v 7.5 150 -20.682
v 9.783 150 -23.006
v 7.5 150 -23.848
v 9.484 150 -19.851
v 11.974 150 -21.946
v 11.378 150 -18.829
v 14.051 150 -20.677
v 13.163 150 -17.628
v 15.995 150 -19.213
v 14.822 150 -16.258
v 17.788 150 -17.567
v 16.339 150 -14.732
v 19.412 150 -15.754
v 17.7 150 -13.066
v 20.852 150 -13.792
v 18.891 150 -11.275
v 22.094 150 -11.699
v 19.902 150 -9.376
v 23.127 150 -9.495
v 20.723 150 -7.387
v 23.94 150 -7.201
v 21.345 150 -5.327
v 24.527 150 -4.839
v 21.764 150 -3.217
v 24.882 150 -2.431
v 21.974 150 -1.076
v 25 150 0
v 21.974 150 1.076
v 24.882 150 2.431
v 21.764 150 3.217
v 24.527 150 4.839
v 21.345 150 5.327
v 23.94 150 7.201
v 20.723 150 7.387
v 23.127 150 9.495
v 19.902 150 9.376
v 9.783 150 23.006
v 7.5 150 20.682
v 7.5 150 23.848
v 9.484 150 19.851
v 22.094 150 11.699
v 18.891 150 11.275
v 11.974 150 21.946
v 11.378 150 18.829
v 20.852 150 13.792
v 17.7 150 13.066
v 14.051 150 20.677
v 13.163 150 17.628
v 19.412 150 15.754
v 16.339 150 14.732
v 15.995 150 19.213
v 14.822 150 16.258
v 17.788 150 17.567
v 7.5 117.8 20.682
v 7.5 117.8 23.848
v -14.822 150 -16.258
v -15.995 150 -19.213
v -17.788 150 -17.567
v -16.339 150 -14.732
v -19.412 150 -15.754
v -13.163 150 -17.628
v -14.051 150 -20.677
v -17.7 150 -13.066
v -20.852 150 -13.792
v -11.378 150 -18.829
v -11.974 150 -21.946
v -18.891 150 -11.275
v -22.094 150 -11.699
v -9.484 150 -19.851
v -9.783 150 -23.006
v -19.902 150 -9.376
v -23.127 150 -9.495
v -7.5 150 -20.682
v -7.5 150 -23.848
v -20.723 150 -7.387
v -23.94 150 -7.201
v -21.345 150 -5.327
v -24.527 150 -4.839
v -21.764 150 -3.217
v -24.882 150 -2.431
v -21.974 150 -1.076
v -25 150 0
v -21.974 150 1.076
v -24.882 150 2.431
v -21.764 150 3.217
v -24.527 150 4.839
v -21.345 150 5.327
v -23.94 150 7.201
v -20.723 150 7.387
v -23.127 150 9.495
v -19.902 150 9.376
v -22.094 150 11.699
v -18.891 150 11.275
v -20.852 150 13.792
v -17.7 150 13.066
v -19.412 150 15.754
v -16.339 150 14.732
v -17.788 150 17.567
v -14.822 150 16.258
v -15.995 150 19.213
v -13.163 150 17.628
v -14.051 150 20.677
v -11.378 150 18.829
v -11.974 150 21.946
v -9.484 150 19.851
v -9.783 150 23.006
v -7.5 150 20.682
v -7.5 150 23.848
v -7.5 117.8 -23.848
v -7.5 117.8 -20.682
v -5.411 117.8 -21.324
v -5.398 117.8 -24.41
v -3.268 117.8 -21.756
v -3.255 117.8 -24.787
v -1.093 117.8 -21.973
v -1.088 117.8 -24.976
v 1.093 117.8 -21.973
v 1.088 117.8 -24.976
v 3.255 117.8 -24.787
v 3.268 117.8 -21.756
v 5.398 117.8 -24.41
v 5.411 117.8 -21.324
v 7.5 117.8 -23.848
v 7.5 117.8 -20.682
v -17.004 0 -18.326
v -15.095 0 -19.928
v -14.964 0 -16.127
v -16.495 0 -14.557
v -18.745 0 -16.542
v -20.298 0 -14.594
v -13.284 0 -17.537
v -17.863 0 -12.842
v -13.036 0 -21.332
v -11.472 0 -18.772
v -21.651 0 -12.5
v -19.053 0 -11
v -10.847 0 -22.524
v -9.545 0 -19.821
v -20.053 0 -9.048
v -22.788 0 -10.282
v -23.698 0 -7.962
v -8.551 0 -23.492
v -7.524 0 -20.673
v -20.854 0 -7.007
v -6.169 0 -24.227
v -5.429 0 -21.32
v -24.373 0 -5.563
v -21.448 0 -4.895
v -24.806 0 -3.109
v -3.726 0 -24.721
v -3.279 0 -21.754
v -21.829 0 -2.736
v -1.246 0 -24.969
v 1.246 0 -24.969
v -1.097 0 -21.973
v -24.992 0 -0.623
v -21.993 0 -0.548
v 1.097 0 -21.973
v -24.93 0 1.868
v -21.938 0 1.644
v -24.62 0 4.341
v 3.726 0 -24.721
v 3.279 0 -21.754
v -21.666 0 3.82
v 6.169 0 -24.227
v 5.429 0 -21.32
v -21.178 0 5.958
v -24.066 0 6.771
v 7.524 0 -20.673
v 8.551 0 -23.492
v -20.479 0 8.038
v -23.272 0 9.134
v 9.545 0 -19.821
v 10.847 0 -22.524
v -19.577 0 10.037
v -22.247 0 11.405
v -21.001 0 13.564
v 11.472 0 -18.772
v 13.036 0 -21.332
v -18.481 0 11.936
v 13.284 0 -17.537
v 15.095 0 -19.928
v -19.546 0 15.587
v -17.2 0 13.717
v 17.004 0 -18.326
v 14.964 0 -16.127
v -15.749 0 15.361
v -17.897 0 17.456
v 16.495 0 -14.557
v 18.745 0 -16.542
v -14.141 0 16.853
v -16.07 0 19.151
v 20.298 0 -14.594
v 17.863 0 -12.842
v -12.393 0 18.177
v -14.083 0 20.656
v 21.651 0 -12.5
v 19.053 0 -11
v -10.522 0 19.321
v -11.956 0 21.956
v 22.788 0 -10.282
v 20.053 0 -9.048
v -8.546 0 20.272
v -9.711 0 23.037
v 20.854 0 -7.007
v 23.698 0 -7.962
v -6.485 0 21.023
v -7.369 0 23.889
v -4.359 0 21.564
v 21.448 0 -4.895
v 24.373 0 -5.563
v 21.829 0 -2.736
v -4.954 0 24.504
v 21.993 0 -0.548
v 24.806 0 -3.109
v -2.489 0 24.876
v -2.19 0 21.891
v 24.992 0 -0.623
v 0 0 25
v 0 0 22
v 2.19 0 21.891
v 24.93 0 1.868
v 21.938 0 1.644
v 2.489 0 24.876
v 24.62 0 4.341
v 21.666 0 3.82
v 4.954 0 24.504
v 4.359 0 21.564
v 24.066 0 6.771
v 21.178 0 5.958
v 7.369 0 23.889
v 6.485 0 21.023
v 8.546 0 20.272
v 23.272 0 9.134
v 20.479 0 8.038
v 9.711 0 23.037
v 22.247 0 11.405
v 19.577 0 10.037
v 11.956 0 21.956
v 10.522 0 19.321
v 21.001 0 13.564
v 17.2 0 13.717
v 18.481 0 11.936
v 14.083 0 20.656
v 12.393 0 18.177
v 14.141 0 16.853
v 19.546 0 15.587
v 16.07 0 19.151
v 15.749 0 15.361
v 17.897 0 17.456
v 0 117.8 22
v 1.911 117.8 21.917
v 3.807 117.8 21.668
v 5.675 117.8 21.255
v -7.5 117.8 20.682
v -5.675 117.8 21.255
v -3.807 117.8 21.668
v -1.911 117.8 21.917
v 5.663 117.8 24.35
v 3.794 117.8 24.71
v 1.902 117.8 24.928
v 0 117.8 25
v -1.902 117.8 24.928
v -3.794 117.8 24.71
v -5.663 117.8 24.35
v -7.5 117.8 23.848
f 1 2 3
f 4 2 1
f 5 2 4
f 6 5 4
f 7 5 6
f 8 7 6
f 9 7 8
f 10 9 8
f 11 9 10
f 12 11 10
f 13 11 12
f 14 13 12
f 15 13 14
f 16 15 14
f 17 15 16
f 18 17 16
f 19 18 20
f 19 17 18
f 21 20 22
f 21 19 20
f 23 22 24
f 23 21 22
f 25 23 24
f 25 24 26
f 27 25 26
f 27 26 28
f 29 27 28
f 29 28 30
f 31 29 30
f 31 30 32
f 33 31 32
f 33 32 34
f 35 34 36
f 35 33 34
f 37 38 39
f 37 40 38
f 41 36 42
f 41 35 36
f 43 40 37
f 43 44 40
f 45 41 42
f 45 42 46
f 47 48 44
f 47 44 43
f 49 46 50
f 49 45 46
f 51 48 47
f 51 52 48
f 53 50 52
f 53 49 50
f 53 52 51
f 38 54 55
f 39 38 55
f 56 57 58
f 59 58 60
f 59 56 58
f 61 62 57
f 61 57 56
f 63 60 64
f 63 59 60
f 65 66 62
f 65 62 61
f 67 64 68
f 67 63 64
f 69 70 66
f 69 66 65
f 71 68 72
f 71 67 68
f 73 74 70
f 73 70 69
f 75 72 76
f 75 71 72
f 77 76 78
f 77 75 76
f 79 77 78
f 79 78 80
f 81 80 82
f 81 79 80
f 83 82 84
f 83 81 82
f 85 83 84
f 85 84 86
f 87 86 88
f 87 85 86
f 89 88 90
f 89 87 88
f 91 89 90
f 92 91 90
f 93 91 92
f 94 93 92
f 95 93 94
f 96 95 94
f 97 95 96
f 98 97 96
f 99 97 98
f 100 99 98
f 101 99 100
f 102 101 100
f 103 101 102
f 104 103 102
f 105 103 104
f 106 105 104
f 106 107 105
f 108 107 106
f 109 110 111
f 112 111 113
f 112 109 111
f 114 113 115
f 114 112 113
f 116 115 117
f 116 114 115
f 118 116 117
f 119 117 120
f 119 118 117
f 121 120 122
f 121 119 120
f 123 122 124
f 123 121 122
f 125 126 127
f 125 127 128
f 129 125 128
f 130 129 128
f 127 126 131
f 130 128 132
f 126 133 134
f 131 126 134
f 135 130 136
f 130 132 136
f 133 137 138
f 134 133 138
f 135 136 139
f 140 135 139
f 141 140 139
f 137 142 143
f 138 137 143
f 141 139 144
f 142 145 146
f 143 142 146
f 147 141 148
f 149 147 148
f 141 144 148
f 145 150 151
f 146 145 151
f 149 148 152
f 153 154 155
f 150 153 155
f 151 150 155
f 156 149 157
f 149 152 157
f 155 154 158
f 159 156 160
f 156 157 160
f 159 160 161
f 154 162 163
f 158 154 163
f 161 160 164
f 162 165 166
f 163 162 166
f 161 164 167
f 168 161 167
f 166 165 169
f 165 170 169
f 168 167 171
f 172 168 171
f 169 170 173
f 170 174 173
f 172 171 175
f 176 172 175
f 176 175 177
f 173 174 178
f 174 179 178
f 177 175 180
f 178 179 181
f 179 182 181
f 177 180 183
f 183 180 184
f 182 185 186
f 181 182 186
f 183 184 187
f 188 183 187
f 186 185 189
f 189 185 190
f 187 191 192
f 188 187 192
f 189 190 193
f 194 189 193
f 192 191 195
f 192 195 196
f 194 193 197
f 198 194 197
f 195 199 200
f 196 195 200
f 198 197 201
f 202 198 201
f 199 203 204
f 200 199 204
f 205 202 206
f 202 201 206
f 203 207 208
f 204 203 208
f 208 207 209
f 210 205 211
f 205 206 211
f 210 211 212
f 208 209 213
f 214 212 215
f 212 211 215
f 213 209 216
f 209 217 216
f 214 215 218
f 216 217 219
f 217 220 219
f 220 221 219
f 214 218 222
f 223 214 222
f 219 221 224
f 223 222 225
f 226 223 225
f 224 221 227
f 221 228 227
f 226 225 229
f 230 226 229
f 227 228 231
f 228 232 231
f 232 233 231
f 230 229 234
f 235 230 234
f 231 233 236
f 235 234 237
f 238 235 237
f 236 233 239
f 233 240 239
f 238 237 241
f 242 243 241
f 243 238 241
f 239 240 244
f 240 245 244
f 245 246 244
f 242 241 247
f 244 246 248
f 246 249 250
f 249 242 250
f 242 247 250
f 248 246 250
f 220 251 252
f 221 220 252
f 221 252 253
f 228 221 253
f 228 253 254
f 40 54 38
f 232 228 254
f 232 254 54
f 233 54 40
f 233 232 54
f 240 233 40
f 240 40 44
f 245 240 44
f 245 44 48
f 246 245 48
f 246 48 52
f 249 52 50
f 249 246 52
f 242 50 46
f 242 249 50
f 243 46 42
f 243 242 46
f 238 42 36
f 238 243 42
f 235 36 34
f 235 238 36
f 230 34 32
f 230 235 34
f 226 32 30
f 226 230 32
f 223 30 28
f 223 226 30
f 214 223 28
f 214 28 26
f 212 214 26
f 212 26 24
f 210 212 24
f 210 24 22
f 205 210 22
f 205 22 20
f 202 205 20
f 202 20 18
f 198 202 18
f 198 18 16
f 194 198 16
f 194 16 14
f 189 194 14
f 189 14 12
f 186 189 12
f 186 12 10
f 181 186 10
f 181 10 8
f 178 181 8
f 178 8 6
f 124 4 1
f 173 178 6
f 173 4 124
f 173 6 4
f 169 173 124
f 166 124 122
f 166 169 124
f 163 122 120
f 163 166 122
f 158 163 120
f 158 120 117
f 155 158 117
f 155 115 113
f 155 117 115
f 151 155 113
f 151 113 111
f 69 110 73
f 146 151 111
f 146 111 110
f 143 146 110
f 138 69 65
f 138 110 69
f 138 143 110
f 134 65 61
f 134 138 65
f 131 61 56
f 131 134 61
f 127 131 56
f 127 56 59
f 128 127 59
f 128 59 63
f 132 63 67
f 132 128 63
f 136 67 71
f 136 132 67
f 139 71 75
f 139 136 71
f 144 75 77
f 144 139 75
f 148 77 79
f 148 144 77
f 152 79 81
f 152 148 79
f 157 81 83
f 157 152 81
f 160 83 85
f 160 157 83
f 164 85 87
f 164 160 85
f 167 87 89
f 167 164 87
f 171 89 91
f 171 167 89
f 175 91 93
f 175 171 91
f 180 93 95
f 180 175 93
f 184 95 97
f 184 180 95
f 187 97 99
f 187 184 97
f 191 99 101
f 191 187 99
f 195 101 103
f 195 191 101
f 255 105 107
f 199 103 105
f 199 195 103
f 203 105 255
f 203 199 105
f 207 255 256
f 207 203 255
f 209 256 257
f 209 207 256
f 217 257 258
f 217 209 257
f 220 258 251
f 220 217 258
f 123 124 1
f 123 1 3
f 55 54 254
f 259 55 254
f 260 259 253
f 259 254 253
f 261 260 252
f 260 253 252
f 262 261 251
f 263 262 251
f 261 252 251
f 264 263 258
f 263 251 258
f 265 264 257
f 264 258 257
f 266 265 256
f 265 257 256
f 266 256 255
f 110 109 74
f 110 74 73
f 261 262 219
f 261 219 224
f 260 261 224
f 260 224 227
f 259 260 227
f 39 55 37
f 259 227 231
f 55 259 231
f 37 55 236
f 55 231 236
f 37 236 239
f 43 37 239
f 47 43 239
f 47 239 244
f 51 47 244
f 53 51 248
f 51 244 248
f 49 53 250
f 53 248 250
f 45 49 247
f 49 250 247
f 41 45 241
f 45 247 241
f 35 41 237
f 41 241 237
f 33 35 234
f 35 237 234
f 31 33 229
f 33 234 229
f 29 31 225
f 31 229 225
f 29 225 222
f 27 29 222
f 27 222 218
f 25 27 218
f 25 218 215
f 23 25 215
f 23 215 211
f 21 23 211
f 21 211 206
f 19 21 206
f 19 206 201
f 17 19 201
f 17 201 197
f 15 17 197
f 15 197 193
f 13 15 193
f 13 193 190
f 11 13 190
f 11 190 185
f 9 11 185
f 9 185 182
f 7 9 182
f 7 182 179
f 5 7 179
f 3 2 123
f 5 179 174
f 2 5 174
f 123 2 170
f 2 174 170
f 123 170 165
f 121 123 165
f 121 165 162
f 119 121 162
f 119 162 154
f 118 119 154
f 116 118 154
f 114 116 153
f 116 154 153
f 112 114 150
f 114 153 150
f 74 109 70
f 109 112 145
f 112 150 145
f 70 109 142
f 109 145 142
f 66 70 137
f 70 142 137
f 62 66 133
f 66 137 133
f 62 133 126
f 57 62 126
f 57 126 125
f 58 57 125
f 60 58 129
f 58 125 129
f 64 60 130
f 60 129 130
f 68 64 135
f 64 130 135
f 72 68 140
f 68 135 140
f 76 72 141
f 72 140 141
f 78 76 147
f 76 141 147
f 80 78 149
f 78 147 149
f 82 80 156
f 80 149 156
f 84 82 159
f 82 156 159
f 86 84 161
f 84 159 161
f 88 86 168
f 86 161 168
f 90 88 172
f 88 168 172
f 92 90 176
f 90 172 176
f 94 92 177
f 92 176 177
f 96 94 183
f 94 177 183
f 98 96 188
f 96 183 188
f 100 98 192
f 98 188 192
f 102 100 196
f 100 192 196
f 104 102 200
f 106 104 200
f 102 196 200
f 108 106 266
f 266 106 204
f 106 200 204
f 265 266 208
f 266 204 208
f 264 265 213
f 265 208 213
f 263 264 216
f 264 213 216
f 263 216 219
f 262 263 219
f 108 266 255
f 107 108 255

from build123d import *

# Parameters (mm, degrees)
ESBO_O1_R                = 25
ESBO_O1_R_2              = 22
RESSALTO_EXTRUS_O1_DEPTH = 150
CORTE_EXTRUS_O2_START    = -32.2
CORTE_EXTRUS_O2_DEPTH    = 32.2


with BuildPart() as part:
    # Esboço1 → Ressalto-extrusão1 (new body)
    with BuildSketch(Plane(origin=(0, 0, 0), x_dir=(1, 0, 0), z_dir=(0, 1, 0))):
        with Locations(Location((0, 0, 0), (0, 0, 270))):
            Circle(ESBO_O1_R)
        with Locations(Location((0, 0, 0), (0, 0, 270))):
            Circle(ESBO_O1_R_2, mode=Mode.SUBTRACT)
    extrude(amount=RESSALTO_EXTRUS_O1_DEPTH)

    # Esboço3 → Corte-extrusão2 (cut)
    with BuildSketch(Plane(origin=(0, 150, 0), x_dir=(1, 0, 0), z_dir=(0, 1, 0)).offset(CORTE_EXTRUS_O2_START)):
        with BuildLine():
            Line((7.5, -20.68211788), (7.5, -23.848480035))
            ThreePointArc((7.5, -23.848480035), (0, -25), (-7.5, -23.848480035))
            Line((-7.5, -23.848480035), (-7.5, -20.68211788))
            ThreePointArc((-7.5, -20.68211788), (0, -22), (7.5, -20.68211788))
        make_face()
        with BuildLine():
            Line((-7.5, 23.848480035), (-7.5, 20.68211788))
            ThreePointArc((-7.5, 20.68211788), (0, 22), (7.5, 20.68211788))
            Line((7.5, 20.68211788), (7.5, 23.848480035))
            ThreePointArc((7.5, 23.848480035), (0, 25), (-7.5, 23.848480035))
        make_face()
    extrude(amount=CORTE_EXTRUS_O2_DEPTH, mode=Mode.SUBTRACT)


solid = part.part
